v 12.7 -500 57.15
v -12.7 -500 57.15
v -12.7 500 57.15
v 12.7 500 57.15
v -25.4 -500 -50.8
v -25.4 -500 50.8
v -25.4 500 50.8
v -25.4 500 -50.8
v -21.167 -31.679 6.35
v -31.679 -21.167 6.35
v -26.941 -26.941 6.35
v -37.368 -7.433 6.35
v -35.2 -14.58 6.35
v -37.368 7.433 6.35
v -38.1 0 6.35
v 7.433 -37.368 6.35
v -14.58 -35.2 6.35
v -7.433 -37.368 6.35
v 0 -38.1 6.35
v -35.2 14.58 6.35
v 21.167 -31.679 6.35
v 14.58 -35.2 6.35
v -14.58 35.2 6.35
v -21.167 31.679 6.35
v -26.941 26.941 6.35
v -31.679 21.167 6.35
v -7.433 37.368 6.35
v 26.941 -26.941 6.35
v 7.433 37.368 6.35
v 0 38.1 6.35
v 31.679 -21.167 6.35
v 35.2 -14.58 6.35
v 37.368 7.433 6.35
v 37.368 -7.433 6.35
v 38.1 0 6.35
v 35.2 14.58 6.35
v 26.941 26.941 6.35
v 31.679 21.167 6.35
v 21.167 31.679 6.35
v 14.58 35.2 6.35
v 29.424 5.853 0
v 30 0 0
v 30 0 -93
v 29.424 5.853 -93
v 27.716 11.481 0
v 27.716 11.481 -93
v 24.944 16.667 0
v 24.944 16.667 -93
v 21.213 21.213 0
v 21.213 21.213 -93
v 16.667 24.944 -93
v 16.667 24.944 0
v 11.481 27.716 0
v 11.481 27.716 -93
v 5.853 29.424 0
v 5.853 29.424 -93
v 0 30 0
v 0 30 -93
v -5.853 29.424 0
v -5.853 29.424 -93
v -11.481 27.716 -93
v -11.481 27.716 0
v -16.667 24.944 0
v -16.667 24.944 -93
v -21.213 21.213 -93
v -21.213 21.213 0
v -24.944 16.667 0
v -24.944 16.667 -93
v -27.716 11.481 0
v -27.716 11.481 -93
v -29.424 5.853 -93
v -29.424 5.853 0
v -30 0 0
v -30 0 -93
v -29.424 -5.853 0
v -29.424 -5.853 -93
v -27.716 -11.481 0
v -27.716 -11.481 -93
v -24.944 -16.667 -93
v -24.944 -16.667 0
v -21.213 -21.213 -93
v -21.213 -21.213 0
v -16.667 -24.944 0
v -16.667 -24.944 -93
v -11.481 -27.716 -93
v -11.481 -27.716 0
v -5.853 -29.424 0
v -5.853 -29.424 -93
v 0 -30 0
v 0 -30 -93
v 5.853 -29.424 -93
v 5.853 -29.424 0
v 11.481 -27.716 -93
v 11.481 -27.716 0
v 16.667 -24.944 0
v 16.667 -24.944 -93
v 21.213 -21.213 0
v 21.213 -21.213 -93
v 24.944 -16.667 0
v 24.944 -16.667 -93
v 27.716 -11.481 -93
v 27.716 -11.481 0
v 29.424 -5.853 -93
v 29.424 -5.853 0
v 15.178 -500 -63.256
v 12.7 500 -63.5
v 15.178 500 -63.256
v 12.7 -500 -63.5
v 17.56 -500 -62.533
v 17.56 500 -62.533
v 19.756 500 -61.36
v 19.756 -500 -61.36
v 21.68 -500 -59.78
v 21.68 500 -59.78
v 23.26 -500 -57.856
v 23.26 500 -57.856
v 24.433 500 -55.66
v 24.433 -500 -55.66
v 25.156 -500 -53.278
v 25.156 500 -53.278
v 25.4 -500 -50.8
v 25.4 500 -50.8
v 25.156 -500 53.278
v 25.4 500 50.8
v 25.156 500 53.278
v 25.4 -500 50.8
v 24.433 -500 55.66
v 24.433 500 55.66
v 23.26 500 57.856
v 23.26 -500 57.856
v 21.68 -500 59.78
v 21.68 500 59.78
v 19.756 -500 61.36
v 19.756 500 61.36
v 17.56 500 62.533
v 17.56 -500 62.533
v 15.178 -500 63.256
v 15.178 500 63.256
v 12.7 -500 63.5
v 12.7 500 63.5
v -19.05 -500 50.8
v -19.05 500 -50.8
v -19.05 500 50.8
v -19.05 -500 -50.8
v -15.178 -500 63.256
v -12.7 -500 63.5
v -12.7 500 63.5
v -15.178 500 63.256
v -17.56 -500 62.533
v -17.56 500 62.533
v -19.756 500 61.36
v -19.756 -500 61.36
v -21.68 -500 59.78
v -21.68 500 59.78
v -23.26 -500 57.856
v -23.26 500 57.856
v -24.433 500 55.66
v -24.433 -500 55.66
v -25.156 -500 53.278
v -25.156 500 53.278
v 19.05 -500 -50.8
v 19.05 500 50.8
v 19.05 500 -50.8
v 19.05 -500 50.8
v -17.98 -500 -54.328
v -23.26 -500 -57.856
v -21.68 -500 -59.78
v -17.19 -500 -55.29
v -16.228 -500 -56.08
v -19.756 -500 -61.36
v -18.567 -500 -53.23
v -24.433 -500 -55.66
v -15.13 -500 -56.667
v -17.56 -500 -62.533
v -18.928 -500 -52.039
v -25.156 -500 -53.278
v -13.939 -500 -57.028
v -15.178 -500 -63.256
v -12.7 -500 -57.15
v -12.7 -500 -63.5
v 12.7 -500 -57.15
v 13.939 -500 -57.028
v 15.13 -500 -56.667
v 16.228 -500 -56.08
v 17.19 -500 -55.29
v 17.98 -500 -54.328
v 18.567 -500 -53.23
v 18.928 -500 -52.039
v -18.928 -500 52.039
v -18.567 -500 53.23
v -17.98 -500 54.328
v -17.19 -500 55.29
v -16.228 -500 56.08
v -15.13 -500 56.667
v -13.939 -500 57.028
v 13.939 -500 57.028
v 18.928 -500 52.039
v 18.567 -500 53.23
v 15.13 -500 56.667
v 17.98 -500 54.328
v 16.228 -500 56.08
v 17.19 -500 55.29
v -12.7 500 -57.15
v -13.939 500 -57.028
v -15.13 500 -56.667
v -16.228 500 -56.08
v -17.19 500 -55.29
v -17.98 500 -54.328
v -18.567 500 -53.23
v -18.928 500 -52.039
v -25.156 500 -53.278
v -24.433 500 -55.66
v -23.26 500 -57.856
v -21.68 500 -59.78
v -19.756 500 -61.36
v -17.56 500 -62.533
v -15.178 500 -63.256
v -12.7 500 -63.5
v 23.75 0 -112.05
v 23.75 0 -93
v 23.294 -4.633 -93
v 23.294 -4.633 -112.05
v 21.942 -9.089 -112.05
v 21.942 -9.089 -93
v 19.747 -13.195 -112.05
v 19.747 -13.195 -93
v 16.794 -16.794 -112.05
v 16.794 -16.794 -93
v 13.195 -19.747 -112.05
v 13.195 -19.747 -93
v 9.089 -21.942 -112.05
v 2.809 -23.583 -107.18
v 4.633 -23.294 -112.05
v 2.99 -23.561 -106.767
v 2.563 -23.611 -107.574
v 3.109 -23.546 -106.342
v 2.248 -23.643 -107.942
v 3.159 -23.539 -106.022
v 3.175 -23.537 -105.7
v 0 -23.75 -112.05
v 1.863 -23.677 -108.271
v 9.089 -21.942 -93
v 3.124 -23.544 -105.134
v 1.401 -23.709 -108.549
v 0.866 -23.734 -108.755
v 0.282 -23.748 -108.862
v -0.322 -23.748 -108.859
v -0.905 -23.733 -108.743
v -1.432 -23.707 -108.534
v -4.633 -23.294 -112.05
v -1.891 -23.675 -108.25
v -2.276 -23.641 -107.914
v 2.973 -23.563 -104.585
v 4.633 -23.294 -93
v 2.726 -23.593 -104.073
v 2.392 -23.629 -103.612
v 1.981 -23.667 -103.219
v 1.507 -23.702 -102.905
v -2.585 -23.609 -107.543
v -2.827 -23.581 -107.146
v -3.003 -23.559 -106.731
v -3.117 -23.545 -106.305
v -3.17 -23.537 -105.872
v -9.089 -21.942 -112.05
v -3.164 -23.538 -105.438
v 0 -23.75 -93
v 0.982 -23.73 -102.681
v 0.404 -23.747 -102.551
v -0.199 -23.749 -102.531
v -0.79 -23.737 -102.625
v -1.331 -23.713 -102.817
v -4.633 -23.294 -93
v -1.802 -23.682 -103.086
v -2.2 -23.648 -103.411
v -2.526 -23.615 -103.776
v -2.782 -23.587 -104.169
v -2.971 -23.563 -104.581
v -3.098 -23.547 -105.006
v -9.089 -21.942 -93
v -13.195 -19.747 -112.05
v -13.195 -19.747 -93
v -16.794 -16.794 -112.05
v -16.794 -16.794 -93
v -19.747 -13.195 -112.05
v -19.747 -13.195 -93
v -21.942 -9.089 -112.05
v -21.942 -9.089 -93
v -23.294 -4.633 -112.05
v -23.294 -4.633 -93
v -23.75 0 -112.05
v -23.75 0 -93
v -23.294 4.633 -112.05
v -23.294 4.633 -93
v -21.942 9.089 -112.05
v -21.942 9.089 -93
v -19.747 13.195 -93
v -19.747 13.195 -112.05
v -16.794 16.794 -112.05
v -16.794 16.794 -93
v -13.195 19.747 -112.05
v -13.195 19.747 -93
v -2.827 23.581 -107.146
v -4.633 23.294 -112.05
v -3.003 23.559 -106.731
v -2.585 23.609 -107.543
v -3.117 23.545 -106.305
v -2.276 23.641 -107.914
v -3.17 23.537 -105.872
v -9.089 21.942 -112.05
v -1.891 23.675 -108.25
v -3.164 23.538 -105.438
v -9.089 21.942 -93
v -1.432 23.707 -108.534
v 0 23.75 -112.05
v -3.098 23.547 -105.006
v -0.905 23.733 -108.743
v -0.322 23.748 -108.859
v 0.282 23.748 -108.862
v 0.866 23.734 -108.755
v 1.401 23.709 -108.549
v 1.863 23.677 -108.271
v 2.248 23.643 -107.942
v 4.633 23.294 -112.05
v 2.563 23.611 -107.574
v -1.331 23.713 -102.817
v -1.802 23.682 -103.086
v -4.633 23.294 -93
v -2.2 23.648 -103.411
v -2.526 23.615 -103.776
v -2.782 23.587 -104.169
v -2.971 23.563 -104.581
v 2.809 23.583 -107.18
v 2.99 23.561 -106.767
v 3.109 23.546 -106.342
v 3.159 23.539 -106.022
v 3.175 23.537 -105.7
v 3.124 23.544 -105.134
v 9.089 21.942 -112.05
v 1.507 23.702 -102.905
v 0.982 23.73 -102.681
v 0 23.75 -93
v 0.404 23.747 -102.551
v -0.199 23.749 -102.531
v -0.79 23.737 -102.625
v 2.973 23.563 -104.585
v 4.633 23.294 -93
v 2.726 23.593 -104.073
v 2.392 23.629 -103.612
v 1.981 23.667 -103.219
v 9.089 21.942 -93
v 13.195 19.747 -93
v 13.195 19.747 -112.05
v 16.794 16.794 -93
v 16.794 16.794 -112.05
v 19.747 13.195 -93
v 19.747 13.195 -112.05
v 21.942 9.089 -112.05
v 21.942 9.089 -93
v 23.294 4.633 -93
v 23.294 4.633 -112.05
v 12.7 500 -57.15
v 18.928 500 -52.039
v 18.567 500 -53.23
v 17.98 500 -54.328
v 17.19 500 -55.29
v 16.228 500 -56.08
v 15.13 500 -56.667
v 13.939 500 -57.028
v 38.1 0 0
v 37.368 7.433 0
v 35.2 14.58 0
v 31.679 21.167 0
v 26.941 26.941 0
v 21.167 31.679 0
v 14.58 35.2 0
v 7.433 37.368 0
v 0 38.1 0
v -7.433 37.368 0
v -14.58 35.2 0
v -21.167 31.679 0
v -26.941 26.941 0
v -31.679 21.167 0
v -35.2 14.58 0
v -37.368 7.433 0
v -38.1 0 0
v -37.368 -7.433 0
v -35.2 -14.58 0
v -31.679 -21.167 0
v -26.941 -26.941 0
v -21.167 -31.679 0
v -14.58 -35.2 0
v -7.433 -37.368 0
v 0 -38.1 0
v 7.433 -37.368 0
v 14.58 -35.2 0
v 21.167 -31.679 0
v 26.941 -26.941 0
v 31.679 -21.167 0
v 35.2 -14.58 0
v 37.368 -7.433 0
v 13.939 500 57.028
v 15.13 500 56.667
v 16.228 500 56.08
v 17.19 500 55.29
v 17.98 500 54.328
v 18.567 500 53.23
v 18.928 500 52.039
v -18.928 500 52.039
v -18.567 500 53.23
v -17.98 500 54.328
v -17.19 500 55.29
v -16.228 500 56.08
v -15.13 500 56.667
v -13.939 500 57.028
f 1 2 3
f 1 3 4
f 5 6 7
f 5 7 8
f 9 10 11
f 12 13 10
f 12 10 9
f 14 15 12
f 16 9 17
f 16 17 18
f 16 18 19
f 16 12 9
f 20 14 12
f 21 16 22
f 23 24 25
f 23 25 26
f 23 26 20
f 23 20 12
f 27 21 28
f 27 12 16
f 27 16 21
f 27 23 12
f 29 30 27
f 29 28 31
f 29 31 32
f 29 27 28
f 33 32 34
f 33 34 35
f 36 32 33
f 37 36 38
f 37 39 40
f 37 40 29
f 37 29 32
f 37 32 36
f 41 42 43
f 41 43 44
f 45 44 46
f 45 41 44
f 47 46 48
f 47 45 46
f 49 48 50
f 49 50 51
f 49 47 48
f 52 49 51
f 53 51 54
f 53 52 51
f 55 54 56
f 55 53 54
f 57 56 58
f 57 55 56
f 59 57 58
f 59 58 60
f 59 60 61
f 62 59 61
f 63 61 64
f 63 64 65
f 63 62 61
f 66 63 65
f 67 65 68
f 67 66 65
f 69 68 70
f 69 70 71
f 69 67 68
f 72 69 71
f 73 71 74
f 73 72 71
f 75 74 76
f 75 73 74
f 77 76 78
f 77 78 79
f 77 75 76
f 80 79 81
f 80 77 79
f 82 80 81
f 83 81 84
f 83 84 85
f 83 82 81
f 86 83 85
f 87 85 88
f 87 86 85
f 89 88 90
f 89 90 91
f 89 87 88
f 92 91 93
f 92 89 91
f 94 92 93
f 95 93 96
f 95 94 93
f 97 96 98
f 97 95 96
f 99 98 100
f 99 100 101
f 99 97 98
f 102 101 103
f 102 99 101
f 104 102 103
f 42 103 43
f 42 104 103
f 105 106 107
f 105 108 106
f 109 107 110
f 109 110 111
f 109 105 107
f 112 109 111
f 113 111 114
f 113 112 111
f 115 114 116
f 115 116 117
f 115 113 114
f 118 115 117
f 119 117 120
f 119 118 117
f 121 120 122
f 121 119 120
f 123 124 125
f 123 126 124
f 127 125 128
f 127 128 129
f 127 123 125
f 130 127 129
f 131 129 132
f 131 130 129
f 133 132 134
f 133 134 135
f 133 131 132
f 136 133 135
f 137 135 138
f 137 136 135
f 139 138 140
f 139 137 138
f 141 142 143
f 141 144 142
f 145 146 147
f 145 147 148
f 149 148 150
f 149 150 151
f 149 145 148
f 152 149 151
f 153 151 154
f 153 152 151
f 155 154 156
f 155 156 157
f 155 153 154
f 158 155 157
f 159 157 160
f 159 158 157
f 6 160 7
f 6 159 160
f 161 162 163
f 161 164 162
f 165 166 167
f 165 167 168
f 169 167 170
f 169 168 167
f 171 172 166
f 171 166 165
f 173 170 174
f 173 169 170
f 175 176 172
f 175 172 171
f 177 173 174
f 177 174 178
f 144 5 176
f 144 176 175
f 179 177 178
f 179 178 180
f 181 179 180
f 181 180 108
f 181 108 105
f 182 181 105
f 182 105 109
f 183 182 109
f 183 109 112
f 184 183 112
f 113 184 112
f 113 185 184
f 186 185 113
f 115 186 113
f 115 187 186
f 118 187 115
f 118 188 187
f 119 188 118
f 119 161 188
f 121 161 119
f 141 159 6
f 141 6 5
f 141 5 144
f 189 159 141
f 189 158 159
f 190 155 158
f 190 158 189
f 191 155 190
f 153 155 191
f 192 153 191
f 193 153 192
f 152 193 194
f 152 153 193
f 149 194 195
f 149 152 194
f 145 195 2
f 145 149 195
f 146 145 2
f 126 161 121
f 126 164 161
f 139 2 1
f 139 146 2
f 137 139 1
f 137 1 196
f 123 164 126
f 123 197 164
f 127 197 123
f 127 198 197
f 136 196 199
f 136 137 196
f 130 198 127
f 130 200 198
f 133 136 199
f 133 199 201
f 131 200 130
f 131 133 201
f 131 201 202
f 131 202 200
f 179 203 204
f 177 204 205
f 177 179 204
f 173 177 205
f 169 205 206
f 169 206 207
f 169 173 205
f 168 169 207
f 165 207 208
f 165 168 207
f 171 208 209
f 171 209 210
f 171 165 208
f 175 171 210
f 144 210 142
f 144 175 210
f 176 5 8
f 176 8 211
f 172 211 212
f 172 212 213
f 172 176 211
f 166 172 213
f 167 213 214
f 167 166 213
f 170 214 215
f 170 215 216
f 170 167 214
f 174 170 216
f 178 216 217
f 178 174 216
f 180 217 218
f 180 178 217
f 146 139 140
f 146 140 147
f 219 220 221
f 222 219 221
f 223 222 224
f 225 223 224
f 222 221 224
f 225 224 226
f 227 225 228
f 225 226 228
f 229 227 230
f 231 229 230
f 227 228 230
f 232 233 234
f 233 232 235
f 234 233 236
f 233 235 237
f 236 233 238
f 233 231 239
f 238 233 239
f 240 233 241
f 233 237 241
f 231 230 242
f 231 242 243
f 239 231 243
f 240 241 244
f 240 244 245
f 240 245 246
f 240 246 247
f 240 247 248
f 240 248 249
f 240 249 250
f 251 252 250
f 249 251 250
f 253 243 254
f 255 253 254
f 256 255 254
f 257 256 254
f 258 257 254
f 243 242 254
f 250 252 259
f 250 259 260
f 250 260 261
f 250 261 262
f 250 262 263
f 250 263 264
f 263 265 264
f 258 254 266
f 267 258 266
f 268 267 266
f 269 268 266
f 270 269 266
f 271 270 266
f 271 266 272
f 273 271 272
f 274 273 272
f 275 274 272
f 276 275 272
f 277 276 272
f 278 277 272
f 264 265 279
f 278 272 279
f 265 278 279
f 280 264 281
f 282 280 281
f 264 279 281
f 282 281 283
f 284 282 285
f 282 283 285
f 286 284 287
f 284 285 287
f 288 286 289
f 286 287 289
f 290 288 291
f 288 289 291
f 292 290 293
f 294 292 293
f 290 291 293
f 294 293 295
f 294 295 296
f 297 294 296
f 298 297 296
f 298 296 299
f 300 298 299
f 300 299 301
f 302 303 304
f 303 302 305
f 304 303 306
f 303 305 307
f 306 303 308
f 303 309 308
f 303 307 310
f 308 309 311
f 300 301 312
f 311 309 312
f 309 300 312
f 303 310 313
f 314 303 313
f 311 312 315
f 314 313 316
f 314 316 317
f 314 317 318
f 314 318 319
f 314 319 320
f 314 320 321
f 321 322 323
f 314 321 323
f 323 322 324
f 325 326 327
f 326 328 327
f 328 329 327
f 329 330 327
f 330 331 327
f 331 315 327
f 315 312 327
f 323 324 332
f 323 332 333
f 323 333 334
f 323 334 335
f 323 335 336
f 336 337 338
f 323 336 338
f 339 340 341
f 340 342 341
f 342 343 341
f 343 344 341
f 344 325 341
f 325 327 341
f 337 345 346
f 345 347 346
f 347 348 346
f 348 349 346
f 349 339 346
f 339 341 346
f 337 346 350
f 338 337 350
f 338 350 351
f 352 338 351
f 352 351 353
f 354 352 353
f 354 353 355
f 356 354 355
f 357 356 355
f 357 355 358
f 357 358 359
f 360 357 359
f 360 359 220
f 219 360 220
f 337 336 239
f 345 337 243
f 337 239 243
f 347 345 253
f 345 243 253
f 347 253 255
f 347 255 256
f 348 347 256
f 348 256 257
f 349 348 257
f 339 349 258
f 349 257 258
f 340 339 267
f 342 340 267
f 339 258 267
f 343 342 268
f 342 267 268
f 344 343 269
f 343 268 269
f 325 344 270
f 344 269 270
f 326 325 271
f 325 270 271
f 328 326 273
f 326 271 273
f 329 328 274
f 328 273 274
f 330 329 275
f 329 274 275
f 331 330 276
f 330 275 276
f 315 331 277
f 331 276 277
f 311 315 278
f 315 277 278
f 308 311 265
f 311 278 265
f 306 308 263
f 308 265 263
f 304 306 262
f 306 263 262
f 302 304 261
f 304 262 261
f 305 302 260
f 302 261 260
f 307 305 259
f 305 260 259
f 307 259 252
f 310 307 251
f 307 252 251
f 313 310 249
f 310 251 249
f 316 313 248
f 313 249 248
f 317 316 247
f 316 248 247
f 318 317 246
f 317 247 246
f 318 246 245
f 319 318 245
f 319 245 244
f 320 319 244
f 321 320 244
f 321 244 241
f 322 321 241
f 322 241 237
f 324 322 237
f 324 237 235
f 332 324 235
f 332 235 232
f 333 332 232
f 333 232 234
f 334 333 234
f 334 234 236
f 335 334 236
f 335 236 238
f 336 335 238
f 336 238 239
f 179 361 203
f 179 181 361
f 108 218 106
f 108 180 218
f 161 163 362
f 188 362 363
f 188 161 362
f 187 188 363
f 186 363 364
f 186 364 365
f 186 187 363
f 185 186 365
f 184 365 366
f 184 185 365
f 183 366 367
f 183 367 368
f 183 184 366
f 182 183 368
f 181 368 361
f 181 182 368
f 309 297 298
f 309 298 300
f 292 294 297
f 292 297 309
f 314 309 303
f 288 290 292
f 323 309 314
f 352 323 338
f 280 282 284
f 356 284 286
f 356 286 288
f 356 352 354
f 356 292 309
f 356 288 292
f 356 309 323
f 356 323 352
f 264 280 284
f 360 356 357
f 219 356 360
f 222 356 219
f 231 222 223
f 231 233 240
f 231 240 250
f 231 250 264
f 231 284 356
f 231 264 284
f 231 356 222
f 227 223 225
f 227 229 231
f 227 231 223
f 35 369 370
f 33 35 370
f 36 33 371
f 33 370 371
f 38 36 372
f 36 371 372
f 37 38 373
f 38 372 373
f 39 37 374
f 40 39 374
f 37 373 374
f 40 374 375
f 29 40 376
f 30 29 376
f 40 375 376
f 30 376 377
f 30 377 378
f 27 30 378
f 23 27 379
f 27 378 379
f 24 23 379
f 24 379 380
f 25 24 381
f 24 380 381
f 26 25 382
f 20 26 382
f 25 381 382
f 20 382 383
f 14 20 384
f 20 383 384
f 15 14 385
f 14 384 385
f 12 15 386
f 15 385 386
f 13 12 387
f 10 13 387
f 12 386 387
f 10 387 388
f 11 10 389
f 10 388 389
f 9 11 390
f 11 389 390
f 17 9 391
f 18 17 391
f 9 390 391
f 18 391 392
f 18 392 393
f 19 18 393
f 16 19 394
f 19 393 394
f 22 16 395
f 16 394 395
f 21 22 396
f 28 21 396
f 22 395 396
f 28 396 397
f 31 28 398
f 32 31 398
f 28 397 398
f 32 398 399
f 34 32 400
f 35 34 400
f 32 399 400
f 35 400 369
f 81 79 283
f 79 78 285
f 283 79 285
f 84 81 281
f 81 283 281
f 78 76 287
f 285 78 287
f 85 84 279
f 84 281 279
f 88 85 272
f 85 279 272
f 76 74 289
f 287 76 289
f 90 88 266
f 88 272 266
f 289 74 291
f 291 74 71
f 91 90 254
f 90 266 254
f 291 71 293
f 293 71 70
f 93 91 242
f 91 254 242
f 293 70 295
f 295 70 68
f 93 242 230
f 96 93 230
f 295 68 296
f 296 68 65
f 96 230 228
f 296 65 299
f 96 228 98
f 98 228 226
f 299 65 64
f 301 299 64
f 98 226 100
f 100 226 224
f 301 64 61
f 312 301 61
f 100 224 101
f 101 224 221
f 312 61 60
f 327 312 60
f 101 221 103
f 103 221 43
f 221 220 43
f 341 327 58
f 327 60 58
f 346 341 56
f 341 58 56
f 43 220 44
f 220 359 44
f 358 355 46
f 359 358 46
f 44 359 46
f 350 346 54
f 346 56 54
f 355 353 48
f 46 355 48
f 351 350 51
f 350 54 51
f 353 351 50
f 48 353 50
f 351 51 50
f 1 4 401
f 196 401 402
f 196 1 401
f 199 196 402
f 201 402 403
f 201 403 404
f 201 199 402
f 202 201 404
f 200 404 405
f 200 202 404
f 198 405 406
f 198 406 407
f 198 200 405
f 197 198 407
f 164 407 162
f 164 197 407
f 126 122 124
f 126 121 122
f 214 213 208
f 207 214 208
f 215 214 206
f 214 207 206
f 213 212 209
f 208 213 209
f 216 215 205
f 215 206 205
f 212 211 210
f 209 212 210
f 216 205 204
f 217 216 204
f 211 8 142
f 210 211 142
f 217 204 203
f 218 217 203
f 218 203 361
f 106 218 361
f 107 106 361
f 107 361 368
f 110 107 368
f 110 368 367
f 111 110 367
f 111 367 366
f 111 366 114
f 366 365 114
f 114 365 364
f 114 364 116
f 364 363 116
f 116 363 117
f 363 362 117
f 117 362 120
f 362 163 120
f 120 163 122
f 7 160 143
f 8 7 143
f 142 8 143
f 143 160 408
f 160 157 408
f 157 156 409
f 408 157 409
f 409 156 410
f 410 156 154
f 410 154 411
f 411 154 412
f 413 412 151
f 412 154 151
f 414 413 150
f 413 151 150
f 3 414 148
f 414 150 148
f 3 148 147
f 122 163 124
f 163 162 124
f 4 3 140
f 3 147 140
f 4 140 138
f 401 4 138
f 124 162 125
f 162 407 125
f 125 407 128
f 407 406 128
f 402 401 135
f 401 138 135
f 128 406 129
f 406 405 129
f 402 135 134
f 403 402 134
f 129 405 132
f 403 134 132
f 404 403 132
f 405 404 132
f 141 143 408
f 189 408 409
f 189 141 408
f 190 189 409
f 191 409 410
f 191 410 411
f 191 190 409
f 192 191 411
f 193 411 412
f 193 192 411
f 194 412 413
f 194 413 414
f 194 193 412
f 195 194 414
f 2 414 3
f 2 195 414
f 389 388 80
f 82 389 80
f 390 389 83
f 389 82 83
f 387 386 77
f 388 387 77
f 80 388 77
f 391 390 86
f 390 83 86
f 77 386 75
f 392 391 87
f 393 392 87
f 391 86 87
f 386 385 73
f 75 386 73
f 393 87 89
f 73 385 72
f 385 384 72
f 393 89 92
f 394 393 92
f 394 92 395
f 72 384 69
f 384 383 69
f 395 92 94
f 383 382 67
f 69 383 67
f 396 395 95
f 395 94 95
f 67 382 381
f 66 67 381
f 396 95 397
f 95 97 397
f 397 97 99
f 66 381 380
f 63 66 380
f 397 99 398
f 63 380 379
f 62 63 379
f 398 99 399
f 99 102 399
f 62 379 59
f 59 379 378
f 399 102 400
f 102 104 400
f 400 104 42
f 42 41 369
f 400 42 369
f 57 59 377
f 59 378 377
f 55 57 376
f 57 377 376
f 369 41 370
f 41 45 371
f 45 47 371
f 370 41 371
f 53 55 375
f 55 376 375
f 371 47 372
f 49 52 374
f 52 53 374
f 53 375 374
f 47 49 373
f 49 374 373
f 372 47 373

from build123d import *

# Parameters (mm, degrees)
F0_R      = 30
F1_DEPTH  = 93
F2_R      = 38.1
F3_DEPTH  = 6.35
F4_R      = 23.75
F5_DEPTH  = 19.05
F6_R      = 3.175
F7_DEPTH  = 30
F9_R      = 23.75
F10_DEPTH = 19.05
F11_R     = 3.175
F12_DEPTH = 30
F14_DEPTH = 500


with BuildPart() as f1:
    # F0 (on Top) → F1 (new body)
    with BuildSketch(Plane.XY):
        Circle(F0_R)
    extrude(amount=-F1_DEPTH)

    # F2 (on face) → F3 (join)
    with BuildSketch(Plane.XY):
        Circle(F2_R)
    extrude(amount=F3_DEPTH)

    # F9 (on face) → F10 (join)
    with BuildSketch(Plane(origin=(0, 0, -93), x_dir=(1, 0, 0), z_dir=(0, 0, -1))):
        Circle(F9_R)
    extrude(amount=F10_DEPTH)

    # F11 (on Front) → F12 (cut, symmetric)
    with BuildSketch(Plane.XZ):
        with Locations((0, -105.7)):
            Circle(F11_R)
    extrude(amount=F12_DEPTH, both=True, mode=Mode.SUBTRACT)


with BuildPart() as f5:
    # F4 (on face) → F5 (new body)
    with BuildSketch(Plane(origin=(0, 0, -93), x_dir=(1, 0, 0), z_dir=(0, 0, -1))):
        Circle(F4_R)
    extrude(amount=F5_DEPTH)

    # F6 (on Front) → F7 (cut, symmetric)
    with BuildSketch(Plane.XZ):
        with Locations((0, -105.7)):
            Circle(F6_R)
    extrude(amount=F7_DEPTH, both=True, mode=Mode.SUBTRACT)


with BuildPart() as f14:
    # F13 (on Front) → F14 (new body, symmetric)
    with BuildSketch(Plane.XZ):
        with BuildLine():
            ThreePointArc((25.4, 50.8), (21.680256, 59.780256), (12.7, 63.5))
            Line((12.7, 63.5), (-12.7, 63.5))
            ThreePointArc((-12.7, 63.5), (-21.680256, 59.780256), (-25.4, 50.8))
            Line((-25.4, 50.8), (-25.4, -50.8))
            ThreePointArc((-25.4, -50.8), (-21.680256, -59.780256), (-12.7, -63.5))
            Line((-12.7, -63.5), (12.7, -63.5))
            ThreePointArc((12.7, -63.5), (21.680256, -59.780256), (25.4, -50.8))
            Line((25.4, -50.8), (25.4, 50.8))
        make_face()
        with BuildLine():
            Line((-12.7, 57.15), (12.7, 57.15))
            ThreePointArc((12.7, 57.15), (17.190128, 55.290128), (19.05, 50.8))
            Line((19.05, 50.8), (19.05, -50.8))
            ThreePointArc((19.05, -50.8), (17.190128, -55.290128), (12.7, -57.15))
            Line((12.7, -57.15), (-12.7, -57.15))
            ThreePointArc((-12.7, -57.15), (-17.190128, -55.290128), (-19.05, -50.8))
            Line((-19.05, -50.8), (-19.05, 50.8))
            ThreePointArc((-19.05, 50.8), (-17.190128, 55.290128), (-12.7, 57.15))
        make_face(mode=Mode.SUBTRACT)
    extrude(amount=F14_DEPTH, both=True)


solid = Compound([f1.part, f14.part])
